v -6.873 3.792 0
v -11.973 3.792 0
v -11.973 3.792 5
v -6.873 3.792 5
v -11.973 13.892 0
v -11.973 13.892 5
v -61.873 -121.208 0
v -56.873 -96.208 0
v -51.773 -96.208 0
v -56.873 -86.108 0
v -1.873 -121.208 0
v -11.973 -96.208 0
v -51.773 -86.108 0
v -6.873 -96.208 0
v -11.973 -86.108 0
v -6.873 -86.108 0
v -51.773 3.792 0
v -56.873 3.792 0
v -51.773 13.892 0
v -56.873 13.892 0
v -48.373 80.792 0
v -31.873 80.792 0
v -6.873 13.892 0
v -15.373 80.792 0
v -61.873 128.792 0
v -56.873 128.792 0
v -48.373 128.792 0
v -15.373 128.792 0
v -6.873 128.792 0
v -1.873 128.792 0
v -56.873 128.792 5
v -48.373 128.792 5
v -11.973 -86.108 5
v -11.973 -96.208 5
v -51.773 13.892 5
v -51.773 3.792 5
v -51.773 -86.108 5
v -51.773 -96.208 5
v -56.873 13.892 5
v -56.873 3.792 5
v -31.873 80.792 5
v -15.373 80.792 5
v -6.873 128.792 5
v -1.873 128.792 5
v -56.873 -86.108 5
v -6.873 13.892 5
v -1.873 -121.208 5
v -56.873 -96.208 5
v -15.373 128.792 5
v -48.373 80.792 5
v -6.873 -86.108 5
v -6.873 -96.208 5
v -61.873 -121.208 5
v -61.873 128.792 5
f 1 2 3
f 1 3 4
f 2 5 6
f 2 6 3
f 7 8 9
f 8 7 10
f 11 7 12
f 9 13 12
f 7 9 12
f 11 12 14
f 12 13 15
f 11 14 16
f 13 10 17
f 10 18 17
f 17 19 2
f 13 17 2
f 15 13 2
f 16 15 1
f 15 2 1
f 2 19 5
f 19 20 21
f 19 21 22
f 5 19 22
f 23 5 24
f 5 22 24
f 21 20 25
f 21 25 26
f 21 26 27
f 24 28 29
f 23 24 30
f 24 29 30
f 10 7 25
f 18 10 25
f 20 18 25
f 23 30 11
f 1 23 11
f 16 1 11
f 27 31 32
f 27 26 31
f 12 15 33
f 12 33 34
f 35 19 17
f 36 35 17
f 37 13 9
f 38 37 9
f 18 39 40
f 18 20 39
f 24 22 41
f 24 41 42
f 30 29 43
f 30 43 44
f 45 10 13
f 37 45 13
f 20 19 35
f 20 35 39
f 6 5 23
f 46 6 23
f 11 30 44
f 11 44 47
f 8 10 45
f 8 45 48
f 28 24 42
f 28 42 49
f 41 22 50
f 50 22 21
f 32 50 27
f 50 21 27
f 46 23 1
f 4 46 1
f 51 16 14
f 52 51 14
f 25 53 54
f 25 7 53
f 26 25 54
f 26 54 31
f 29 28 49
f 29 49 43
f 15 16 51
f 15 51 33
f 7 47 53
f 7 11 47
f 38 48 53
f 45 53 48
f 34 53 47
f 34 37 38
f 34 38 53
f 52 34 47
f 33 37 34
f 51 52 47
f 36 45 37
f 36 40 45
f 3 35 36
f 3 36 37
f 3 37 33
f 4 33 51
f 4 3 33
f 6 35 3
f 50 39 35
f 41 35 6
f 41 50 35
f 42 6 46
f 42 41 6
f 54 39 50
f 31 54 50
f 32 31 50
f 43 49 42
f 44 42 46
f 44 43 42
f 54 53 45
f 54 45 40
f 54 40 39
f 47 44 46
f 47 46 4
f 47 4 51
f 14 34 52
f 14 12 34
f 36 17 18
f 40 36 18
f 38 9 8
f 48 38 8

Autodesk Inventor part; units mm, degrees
ref_plane "YZ Plane" through (0, 0, 0) normal (1, 0, 0) x (0, 1, 0)
ref_plane "XZ Plane" through (0, 0, 0) normal (0, 1, 0) x (-1, 0, 0)
ref_plane "XY Plane" through (0, 0, 0) normal (0, 0, 1) x (1, 0, 0)
sketch "Sketch1" plane through (0, 0, 0) normal (0, 0, 1) x (1, 0, 0)
  line L0 (-61.8733, -121.208) -> (-61.8733, 128.792)
  line L1 (-61.8733, 128.792) -> (-1.8733, 128.792)
  line L2 (-1.8733, 128.792) -> (-1.8733, -121.208)
  line L3 (-1.8733, -121.208) -> (-61.8733, -121.208)
  line L4 (-66.8733, 113.892) -> (-51.7733, 113.892) construction
  line L5 (-66.8733, 103.792) -> (-1.8733, 103.792) construction
  line L6 (-56.8733, -86.108) -> (-51.7733, -86.108)
  line L7 (-51.7733, -96.208) -> (-56.8733, -96.208)
  line L8 (-51.7733, 13.892) -> (-56.8733, 13.892)
  line L9 (-51.7733, 3.792) -> (-56.8733, 3.792)
  line L10 (-51.7733, 3.792) -> (-51.7733, -86.108) construction
  line L11 (-56.8733, 3.792) -> (-56.8733, -86.108) construction
  line L12 (-51.7733, 13.892) -> (-51.7733, 3.792)
  line L13 (-56.8733, 13.892) -> (-56.8733, 3.792)
  line L14 (-51.7733, 103.792) -> (-51.7733, 13.892) construction
  line L15 (-56.8733, 103.792) -> (-56.8733, 80.792) construction
  line L16 (-51.7733, -86.108) -> (-51.7733, -96.208)
  line L17 (-56.8733, -86.108) -> (-56.8733, -96.208)
  line L18 (-31.8733, 128.792) -> (-31.8733, -121.208) construction
  line L19 (3.1267, 103.792) -> (-61.8733, 103.792) construction
  line L20 (3.1267, 113.892) -> (-61.8733, 113.892) construction
  line L21 (-11.9733, 13.892) -> (-6.8733, 13.892)
  line L22 (-11.9733, 3.792) -> (-6.8733, 3.792)
  line L23 (-11.9733, 13.892) -> (-11.9733, 3.792)
  line L24 (-6.8733, 13.892) -> (-6.8733, 3.792)
  line L25 (-6.8733, -86.108) -> (-6.8733, -96.208)
  line L26 (-6.8733, -86.108) -> (-11.9733, -86.108)
  line L27 (-11.9733, -86.108) -> (-11.9733, -96.208)
  line L28 (-11.9733, -96.208) -> (-6.8733, -96.208)
  line L29 (-1.8733, 128.792) -> (-6.8733, 128.792)
  line L30 (-51.7733, 113.892) -> (-1.8733, 113.892) construction
  line L31 (-61.8733, 128.792) -> (-56.8733, 128.792)
  line L32 (-31.8733, 80.792) -> (-48.3733, 80.792)
  line L33 (-48.3733, 80.792) -> (-48.3733, 128.792)
  line L34 (-31.8733, 80.792) -> (-15.3733, 80.792)
  line L35 (-15.3733, 80.792) -> (-15.3733, 128.792)
  point P0 (0, 0)
  point P1 (-56.8733, 92.292)
  dimension "d6" = 60
  dimension "d7" = 5
  dimension "d11" = 48
  dimension "d12" = 39.8
  dimension "d16" = 25
  dimension "d17" = 16.5
  dimension "d18" = 16.5
extrude "Extrusion1" add sketch "Sketch1" along normal blind 5 contours L0 L1 L33 L32 L34 L35 L2 L3
properties part number "Lifting Sections left"
